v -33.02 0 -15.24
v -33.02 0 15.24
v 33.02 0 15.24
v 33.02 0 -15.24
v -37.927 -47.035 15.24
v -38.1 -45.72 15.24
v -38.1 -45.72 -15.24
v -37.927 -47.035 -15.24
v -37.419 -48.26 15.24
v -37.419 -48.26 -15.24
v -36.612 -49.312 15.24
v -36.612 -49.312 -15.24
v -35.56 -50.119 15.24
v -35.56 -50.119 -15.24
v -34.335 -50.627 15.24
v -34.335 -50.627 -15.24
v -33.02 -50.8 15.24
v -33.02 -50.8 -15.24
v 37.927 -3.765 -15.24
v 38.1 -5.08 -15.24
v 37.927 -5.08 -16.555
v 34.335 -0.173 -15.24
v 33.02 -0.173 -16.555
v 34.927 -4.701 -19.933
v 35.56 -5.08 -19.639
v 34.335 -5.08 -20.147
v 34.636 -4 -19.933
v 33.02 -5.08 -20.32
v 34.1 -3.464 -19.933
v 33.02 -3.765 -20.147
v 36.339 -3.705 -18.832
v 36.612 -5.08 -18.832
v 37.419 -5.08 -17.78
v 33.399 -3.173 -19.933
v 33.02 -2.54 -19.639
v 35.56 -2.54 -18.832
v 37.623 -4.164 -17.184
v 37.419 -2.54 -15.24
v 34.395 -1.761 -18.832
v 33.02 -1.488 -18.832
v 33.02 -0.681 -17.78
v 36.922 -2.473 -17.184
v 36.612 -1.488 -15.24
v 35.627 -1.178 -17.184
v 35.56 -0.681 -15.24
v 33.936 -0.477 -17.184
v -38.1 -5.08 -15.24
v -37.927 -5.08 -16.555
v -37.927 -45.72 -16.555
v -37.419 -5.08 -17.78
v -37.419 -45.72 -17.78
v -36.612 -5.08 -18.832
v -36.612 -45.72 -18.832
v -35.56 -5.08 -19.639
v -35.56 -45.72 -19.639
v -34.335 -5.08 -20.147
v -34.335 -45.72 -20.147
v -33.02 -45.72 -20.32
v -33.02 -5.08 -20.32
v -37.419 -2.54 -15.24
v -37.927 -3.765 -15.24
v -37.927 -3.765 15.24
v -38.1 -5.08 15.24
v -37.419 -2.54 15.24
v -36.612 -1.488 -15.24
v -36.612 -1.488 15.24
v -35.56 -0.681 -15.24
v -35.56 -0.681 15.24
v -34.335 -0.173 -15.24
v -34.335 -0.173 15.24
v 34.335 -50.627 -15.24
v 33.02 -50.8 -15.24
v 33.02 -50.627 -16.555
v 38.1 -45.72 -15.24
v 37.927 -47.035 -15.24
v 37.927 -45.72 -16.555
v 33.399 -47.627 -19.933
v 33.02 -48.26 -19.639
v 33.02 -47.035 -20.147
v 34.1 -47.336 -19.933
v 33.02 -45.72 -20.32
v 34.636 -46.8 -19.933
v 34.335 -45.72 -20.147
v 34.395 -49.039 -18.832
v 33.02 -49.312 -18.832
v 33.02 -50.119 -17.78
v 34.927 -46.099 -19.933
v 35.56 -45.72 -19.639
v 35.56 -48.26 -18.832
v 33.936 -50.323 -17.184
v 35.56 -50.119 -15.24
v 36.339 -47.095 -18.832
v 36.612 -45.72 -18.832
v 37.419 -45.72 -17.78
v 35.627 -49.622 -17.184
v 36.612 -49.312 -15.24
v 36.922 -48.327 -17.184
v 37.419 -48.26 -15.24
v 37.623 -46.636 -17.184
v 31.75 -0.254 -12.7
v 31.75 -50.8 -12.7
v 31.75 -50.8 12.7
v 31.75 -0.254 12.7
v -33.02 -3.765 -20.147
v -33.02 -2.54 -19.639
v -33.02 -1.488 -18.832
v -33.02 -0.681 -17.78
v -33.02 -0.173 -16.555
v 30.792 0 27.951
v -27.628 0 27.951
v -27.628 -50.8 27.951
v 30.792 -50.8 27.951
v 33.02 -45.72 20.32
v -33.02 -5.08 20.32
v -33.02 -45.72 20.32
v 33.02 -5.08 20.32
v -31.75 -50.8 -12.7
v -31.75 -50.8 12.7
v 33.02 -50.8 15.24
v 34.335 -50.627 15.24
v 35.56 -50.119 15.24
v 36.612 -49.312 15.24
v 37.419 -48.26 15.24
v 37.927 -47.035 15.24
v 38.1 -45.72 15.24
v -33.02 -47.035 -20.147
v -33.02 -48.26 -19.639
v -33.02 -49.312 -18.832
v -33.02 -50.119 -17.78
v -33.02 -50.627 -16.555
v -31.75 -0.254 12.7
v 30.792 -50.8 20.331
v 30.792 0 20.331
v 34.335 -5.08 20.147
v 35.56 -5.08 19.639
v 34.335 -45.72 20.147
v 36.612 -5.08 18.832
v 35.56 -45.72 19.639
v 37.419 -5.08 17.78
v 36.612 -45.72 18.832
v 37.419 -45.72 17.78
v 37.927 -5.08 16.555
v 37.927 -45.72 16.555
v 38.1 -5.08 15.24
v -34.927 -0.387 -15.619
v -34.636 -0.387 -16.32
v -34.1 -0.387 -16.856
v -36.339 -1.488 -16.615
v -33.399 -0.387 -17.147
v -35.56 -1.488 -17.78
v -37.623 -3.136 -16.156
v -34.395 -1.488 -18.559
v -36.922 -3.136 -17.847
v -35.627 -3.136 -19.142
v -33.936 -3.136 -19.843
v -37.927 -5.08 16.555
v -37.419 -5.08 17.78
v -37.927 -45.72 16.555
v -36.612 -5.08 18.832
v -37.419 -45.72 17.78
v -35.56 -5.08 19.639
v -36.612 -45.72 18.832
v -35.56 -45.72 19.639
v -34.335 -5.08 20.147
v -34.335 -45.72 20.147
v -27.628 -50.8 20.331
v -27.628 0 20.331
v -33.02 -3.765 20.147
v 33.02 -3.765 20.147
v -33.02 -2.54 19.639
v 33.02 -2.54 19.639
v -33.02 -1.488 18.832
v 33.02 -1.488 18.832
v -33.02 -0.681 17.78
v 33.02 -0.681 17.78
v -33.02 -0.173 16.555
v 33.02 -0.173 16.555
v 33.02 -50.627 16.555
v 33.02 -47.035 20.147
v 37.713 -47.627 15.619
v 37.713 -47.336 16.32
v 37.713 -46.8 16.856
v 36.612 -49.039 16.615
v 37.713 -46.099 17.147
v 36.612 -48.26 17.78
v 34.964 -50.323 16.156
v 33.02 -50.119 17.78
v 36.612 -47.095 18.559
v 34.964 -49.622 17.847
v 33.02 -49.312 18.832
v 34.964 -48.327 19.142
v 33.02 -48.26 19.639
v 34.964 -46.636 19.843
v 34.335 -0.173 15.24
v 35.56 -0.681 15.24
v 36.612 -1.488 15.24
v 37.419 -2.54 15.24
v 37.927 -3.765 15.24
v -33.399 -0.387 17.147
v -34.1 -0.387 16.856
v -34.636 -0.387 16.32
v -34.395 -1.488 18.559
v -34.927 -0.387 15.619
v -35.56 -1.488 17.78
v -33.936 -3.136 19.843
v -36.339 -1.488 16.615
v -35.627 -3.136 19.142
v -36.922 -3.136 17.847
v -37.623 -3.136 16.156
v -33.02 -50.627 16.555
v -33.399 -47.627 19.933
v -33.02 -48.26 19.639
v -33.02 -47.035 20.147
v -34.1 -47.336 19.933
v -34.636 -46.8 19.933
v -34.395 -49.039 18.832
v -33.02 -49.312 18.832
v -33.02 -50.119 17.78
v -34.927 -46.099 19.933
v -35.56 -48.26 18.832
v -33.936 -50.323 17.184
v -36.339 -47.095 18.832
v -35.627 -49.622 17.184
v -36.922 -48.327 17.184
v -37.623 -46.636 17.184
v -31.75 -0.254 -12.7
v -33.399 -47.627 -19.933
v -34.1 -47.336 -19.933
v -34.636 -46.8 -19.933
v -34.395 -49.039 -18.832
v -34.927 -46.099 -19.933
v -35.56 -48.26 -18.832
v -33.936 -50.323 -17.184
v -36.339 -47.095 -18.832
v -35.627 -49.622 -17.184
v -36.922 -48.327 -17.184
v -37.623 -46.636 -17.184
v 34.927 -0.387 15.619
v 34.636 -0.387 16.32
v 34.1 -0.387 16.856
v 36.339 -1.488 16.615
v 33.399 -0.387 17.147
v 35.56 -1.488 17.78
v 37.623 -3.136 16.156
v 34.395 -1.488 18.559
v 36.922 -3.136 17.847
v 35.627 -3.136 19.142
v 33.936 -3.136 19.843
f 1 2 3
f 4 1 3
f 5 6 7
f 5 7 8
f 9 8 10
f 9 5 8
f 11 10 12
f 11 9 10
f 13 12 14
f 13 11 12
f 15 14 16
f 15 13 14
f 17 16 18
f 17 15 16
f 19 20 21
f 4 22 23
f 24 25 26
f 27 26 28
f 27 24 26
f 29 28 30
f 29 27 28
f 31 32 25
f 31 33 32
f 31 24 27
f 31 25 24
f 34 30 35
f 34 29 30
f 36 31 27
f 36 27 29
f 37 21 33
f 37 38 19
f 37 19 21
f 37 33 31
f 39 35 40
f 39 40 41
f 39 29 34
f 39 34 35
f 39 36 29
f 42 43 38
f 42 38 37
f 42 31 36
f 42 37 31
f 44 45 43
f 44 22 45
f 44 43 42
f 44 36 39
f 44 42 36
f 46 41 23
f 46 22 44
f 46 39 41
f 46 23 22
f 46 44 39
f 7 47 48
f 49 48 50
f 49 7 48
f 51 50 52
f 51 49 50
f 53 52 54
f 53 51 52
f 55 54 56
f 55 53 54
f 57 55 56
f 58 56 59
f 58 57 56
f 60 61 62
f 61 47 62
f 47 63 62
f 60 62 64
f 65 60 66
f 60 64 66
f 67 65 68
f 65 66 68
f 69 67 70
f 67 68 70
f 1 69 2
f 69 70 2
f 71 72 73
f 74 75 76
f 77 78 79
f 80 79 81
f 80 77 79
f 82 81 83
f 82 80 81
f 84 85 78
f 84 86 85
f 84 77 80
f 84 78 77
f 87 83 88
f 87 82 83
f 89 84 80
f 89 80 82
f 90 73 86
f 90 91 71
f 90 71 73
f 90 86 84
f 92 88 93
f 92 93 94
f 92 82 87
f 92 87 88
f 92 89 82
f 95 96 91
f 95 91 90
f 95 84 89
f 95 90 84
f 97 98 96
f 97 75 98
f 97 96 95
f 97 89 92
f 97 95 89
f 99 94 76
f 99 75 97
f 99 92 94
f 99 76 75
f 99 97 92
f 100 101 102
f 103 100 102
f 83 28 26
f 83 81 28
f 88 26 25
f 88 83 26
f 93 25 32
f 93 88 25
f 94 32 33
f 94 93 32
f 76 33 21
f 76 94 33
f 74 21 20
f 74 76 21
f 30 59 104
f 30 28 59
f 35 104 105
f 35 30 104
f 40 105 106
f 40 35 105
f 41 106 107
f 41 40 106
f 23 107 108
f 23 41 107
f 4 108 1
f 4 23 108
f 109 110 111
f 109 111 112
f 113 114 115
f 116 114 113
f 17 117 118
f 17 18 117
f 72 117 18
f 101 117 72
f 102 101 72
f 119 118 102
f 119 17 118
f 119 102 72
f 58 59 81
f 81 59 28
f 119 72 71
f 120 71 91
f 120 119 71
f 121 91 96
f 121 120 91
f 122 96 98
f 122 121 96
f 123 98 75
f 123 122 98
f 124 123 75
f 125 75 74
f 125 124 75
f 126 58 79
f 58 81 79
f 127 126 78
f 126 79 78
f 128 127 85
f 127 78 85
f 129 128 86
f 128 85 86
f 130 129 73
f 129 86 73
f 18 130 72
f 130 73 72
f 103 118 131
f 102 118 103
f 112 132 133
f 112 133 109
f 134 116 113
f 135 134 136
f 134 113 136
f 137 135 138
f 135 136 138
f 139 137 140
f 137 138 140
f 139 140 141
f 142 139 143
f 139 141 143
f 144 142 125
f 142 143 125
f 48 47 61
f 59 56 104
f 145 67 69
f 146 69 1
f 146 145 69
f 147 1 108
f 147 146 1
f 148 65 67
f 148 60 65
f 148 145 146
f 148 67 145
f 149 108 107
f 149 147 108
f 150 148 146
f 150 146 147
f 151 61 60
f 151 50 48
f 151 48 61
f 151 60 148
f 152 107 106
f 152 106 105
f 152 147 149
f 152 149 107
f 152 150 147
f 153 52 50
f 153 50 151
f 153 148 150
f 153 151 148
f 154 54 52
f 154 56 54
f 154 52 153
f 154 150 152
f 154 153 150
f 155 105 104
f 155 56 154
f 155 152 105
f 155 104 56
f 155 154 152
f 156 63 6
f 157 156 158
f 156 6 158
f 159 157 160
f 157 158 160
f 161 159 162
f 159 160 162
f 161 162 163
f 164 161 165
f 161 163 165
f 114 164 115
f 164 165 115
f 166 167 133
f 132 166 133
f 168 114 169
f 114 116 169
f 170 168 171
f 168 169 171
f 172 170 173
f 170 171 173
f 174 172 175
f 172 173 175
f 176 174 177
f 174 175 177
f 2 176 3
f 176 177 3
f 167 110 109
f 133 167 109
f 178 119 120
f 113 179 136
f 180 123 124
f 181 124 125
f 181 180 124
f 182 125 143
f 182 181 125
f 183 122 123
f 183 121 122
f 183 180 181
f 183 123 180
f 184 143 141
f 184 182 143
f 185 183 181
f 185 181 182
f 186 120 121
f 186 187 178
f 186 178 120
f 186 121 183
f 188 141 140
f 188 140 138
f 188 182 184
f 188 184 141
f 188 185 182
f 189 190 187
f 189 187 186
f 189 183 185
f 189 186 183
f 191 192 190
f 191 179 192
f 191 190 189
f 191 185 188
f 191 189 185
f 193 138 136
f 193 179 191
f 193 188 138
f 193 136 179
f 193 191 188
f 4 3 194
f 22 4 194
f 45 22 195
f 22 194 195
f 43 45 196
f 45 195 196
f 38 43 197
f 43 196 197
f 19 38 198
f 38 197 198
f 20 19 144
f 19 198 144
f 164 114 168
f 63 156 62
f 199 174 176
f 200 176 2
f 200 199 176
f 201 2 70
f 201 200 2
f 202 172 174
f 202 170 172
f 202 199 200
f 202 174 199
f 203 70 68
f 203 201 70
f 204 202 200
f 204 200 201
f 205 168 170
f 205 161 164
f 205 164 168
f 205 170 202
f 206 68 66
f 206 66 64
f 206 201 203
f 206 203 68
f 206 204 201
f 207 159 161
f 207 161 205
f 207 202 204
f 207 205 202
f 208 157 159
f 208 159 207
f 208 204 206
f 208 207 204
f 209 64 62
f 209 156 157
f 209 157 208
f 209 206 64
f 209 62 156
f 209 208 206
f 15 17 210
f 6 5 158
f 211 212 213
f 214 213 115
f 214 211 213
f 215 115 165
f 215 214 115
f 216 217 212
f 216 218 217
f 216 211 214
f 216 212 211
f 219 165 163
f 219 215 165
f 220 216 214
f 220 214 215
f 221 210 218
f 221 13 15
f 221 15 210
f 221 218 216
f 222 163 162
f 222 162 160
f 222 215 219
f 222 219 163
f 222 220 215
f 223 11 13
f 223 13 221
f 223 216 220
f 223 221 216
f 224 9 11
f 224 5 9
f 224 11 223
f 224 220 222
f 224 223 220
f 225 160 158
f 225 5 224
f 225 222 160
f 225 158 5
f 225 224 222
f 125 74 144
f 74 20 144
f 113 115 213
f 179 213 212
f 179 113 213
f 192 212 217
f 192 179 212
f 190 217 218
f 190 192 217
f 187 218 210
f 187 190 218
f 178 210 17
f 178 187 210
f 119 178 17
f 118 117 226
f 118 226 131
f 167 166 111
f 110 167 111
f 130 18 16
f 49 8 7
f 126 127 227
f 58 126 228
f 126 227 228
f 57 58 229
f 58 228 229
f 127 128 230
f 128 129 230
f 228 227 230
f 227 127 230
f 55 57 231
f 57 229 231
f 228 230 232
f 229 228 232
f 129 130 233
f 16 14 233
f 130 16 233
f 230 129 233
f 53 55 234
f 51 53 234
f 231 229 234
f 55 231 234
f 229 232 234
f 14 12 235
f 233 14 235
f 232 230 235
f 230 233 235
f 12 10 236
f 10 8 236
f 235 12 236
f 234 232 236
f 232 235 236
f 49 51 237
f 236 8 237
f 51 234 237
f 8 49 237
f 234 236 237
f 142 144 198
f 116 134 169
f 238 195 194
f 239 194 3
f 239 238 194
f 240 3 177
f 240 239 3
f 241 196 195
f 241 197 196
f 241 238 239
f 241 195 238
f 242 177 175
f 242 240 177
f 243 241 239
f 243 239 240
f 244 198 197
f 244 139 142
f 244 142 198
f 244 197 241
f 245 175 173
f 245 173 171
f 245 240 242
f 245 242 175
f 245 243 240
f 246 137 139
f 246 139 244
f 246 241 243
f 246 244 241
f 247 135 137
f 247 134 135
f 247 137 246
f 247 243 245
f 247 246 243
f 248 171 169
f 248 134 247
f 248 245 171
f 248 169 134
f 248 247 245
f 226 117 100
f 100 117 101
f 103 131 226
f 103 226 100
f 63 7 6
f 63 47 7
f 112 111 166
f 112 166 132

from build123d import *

# Parameters (mm, degrees)
F0_W     = 76.2
F0_H     = 40.64
F1_DEPTH = 50.8
F2_W     = 63.5
F2_H     = 25.4
F3_DEPTH = 50.546
F4_W     = 58.42
F4_H     = 7.62
F5_DEPTH = 50.8
F6_R     = 5.08


with BuildPart() as f1:
    # F0 (on Front) → F1 (new body)
    with BuildSketch(Plane.XZ):
        Rectangle(F0_W, F0_H)
    extrude(amount=F1_DEPTH)

    # F2 (on face) → F3 (cut)
    with BuildSketch(Plane.XZ.offset(50.8)):
        Rectangle(F2_W, F2_H)
    extrude(amount=-F3_DEPTH, mode=Mode.SUBTRACT)

    # F6
    f6_edges = [f1.edges().sort_by_distance(p)[0] for p in [
        (-38.1, -50.8, 0),
        (0, -50.8, 20.32),
        (38.1, -50.8, 0),
        (0, -50.8, -20.32),
        (38.1, -25.4, 20.32),
        (38.1, 0, 0),
        (38.1, -25.4, -20.32),
        (-38.1, -25.4, 20.32),
        (0, 0, 20.32),
        (-38.1, -25.4, -20.32),
        (-38.1, 0, 0),
        (0, 0, -20.32),
    ]]
    fillet(f6_edges, radius=F6_R)


with BuildPart() as f5:
    # F4 (on Front) → F5 (new body)
    with BuildSketch(Plane.XZ):
        with Locations((1.582173, 24.140948)):
            Rectangle(F4_W, F4_H)
    extrude(amount=F5_DEPTH)


solid = Compound([f1.part, f5.part])
